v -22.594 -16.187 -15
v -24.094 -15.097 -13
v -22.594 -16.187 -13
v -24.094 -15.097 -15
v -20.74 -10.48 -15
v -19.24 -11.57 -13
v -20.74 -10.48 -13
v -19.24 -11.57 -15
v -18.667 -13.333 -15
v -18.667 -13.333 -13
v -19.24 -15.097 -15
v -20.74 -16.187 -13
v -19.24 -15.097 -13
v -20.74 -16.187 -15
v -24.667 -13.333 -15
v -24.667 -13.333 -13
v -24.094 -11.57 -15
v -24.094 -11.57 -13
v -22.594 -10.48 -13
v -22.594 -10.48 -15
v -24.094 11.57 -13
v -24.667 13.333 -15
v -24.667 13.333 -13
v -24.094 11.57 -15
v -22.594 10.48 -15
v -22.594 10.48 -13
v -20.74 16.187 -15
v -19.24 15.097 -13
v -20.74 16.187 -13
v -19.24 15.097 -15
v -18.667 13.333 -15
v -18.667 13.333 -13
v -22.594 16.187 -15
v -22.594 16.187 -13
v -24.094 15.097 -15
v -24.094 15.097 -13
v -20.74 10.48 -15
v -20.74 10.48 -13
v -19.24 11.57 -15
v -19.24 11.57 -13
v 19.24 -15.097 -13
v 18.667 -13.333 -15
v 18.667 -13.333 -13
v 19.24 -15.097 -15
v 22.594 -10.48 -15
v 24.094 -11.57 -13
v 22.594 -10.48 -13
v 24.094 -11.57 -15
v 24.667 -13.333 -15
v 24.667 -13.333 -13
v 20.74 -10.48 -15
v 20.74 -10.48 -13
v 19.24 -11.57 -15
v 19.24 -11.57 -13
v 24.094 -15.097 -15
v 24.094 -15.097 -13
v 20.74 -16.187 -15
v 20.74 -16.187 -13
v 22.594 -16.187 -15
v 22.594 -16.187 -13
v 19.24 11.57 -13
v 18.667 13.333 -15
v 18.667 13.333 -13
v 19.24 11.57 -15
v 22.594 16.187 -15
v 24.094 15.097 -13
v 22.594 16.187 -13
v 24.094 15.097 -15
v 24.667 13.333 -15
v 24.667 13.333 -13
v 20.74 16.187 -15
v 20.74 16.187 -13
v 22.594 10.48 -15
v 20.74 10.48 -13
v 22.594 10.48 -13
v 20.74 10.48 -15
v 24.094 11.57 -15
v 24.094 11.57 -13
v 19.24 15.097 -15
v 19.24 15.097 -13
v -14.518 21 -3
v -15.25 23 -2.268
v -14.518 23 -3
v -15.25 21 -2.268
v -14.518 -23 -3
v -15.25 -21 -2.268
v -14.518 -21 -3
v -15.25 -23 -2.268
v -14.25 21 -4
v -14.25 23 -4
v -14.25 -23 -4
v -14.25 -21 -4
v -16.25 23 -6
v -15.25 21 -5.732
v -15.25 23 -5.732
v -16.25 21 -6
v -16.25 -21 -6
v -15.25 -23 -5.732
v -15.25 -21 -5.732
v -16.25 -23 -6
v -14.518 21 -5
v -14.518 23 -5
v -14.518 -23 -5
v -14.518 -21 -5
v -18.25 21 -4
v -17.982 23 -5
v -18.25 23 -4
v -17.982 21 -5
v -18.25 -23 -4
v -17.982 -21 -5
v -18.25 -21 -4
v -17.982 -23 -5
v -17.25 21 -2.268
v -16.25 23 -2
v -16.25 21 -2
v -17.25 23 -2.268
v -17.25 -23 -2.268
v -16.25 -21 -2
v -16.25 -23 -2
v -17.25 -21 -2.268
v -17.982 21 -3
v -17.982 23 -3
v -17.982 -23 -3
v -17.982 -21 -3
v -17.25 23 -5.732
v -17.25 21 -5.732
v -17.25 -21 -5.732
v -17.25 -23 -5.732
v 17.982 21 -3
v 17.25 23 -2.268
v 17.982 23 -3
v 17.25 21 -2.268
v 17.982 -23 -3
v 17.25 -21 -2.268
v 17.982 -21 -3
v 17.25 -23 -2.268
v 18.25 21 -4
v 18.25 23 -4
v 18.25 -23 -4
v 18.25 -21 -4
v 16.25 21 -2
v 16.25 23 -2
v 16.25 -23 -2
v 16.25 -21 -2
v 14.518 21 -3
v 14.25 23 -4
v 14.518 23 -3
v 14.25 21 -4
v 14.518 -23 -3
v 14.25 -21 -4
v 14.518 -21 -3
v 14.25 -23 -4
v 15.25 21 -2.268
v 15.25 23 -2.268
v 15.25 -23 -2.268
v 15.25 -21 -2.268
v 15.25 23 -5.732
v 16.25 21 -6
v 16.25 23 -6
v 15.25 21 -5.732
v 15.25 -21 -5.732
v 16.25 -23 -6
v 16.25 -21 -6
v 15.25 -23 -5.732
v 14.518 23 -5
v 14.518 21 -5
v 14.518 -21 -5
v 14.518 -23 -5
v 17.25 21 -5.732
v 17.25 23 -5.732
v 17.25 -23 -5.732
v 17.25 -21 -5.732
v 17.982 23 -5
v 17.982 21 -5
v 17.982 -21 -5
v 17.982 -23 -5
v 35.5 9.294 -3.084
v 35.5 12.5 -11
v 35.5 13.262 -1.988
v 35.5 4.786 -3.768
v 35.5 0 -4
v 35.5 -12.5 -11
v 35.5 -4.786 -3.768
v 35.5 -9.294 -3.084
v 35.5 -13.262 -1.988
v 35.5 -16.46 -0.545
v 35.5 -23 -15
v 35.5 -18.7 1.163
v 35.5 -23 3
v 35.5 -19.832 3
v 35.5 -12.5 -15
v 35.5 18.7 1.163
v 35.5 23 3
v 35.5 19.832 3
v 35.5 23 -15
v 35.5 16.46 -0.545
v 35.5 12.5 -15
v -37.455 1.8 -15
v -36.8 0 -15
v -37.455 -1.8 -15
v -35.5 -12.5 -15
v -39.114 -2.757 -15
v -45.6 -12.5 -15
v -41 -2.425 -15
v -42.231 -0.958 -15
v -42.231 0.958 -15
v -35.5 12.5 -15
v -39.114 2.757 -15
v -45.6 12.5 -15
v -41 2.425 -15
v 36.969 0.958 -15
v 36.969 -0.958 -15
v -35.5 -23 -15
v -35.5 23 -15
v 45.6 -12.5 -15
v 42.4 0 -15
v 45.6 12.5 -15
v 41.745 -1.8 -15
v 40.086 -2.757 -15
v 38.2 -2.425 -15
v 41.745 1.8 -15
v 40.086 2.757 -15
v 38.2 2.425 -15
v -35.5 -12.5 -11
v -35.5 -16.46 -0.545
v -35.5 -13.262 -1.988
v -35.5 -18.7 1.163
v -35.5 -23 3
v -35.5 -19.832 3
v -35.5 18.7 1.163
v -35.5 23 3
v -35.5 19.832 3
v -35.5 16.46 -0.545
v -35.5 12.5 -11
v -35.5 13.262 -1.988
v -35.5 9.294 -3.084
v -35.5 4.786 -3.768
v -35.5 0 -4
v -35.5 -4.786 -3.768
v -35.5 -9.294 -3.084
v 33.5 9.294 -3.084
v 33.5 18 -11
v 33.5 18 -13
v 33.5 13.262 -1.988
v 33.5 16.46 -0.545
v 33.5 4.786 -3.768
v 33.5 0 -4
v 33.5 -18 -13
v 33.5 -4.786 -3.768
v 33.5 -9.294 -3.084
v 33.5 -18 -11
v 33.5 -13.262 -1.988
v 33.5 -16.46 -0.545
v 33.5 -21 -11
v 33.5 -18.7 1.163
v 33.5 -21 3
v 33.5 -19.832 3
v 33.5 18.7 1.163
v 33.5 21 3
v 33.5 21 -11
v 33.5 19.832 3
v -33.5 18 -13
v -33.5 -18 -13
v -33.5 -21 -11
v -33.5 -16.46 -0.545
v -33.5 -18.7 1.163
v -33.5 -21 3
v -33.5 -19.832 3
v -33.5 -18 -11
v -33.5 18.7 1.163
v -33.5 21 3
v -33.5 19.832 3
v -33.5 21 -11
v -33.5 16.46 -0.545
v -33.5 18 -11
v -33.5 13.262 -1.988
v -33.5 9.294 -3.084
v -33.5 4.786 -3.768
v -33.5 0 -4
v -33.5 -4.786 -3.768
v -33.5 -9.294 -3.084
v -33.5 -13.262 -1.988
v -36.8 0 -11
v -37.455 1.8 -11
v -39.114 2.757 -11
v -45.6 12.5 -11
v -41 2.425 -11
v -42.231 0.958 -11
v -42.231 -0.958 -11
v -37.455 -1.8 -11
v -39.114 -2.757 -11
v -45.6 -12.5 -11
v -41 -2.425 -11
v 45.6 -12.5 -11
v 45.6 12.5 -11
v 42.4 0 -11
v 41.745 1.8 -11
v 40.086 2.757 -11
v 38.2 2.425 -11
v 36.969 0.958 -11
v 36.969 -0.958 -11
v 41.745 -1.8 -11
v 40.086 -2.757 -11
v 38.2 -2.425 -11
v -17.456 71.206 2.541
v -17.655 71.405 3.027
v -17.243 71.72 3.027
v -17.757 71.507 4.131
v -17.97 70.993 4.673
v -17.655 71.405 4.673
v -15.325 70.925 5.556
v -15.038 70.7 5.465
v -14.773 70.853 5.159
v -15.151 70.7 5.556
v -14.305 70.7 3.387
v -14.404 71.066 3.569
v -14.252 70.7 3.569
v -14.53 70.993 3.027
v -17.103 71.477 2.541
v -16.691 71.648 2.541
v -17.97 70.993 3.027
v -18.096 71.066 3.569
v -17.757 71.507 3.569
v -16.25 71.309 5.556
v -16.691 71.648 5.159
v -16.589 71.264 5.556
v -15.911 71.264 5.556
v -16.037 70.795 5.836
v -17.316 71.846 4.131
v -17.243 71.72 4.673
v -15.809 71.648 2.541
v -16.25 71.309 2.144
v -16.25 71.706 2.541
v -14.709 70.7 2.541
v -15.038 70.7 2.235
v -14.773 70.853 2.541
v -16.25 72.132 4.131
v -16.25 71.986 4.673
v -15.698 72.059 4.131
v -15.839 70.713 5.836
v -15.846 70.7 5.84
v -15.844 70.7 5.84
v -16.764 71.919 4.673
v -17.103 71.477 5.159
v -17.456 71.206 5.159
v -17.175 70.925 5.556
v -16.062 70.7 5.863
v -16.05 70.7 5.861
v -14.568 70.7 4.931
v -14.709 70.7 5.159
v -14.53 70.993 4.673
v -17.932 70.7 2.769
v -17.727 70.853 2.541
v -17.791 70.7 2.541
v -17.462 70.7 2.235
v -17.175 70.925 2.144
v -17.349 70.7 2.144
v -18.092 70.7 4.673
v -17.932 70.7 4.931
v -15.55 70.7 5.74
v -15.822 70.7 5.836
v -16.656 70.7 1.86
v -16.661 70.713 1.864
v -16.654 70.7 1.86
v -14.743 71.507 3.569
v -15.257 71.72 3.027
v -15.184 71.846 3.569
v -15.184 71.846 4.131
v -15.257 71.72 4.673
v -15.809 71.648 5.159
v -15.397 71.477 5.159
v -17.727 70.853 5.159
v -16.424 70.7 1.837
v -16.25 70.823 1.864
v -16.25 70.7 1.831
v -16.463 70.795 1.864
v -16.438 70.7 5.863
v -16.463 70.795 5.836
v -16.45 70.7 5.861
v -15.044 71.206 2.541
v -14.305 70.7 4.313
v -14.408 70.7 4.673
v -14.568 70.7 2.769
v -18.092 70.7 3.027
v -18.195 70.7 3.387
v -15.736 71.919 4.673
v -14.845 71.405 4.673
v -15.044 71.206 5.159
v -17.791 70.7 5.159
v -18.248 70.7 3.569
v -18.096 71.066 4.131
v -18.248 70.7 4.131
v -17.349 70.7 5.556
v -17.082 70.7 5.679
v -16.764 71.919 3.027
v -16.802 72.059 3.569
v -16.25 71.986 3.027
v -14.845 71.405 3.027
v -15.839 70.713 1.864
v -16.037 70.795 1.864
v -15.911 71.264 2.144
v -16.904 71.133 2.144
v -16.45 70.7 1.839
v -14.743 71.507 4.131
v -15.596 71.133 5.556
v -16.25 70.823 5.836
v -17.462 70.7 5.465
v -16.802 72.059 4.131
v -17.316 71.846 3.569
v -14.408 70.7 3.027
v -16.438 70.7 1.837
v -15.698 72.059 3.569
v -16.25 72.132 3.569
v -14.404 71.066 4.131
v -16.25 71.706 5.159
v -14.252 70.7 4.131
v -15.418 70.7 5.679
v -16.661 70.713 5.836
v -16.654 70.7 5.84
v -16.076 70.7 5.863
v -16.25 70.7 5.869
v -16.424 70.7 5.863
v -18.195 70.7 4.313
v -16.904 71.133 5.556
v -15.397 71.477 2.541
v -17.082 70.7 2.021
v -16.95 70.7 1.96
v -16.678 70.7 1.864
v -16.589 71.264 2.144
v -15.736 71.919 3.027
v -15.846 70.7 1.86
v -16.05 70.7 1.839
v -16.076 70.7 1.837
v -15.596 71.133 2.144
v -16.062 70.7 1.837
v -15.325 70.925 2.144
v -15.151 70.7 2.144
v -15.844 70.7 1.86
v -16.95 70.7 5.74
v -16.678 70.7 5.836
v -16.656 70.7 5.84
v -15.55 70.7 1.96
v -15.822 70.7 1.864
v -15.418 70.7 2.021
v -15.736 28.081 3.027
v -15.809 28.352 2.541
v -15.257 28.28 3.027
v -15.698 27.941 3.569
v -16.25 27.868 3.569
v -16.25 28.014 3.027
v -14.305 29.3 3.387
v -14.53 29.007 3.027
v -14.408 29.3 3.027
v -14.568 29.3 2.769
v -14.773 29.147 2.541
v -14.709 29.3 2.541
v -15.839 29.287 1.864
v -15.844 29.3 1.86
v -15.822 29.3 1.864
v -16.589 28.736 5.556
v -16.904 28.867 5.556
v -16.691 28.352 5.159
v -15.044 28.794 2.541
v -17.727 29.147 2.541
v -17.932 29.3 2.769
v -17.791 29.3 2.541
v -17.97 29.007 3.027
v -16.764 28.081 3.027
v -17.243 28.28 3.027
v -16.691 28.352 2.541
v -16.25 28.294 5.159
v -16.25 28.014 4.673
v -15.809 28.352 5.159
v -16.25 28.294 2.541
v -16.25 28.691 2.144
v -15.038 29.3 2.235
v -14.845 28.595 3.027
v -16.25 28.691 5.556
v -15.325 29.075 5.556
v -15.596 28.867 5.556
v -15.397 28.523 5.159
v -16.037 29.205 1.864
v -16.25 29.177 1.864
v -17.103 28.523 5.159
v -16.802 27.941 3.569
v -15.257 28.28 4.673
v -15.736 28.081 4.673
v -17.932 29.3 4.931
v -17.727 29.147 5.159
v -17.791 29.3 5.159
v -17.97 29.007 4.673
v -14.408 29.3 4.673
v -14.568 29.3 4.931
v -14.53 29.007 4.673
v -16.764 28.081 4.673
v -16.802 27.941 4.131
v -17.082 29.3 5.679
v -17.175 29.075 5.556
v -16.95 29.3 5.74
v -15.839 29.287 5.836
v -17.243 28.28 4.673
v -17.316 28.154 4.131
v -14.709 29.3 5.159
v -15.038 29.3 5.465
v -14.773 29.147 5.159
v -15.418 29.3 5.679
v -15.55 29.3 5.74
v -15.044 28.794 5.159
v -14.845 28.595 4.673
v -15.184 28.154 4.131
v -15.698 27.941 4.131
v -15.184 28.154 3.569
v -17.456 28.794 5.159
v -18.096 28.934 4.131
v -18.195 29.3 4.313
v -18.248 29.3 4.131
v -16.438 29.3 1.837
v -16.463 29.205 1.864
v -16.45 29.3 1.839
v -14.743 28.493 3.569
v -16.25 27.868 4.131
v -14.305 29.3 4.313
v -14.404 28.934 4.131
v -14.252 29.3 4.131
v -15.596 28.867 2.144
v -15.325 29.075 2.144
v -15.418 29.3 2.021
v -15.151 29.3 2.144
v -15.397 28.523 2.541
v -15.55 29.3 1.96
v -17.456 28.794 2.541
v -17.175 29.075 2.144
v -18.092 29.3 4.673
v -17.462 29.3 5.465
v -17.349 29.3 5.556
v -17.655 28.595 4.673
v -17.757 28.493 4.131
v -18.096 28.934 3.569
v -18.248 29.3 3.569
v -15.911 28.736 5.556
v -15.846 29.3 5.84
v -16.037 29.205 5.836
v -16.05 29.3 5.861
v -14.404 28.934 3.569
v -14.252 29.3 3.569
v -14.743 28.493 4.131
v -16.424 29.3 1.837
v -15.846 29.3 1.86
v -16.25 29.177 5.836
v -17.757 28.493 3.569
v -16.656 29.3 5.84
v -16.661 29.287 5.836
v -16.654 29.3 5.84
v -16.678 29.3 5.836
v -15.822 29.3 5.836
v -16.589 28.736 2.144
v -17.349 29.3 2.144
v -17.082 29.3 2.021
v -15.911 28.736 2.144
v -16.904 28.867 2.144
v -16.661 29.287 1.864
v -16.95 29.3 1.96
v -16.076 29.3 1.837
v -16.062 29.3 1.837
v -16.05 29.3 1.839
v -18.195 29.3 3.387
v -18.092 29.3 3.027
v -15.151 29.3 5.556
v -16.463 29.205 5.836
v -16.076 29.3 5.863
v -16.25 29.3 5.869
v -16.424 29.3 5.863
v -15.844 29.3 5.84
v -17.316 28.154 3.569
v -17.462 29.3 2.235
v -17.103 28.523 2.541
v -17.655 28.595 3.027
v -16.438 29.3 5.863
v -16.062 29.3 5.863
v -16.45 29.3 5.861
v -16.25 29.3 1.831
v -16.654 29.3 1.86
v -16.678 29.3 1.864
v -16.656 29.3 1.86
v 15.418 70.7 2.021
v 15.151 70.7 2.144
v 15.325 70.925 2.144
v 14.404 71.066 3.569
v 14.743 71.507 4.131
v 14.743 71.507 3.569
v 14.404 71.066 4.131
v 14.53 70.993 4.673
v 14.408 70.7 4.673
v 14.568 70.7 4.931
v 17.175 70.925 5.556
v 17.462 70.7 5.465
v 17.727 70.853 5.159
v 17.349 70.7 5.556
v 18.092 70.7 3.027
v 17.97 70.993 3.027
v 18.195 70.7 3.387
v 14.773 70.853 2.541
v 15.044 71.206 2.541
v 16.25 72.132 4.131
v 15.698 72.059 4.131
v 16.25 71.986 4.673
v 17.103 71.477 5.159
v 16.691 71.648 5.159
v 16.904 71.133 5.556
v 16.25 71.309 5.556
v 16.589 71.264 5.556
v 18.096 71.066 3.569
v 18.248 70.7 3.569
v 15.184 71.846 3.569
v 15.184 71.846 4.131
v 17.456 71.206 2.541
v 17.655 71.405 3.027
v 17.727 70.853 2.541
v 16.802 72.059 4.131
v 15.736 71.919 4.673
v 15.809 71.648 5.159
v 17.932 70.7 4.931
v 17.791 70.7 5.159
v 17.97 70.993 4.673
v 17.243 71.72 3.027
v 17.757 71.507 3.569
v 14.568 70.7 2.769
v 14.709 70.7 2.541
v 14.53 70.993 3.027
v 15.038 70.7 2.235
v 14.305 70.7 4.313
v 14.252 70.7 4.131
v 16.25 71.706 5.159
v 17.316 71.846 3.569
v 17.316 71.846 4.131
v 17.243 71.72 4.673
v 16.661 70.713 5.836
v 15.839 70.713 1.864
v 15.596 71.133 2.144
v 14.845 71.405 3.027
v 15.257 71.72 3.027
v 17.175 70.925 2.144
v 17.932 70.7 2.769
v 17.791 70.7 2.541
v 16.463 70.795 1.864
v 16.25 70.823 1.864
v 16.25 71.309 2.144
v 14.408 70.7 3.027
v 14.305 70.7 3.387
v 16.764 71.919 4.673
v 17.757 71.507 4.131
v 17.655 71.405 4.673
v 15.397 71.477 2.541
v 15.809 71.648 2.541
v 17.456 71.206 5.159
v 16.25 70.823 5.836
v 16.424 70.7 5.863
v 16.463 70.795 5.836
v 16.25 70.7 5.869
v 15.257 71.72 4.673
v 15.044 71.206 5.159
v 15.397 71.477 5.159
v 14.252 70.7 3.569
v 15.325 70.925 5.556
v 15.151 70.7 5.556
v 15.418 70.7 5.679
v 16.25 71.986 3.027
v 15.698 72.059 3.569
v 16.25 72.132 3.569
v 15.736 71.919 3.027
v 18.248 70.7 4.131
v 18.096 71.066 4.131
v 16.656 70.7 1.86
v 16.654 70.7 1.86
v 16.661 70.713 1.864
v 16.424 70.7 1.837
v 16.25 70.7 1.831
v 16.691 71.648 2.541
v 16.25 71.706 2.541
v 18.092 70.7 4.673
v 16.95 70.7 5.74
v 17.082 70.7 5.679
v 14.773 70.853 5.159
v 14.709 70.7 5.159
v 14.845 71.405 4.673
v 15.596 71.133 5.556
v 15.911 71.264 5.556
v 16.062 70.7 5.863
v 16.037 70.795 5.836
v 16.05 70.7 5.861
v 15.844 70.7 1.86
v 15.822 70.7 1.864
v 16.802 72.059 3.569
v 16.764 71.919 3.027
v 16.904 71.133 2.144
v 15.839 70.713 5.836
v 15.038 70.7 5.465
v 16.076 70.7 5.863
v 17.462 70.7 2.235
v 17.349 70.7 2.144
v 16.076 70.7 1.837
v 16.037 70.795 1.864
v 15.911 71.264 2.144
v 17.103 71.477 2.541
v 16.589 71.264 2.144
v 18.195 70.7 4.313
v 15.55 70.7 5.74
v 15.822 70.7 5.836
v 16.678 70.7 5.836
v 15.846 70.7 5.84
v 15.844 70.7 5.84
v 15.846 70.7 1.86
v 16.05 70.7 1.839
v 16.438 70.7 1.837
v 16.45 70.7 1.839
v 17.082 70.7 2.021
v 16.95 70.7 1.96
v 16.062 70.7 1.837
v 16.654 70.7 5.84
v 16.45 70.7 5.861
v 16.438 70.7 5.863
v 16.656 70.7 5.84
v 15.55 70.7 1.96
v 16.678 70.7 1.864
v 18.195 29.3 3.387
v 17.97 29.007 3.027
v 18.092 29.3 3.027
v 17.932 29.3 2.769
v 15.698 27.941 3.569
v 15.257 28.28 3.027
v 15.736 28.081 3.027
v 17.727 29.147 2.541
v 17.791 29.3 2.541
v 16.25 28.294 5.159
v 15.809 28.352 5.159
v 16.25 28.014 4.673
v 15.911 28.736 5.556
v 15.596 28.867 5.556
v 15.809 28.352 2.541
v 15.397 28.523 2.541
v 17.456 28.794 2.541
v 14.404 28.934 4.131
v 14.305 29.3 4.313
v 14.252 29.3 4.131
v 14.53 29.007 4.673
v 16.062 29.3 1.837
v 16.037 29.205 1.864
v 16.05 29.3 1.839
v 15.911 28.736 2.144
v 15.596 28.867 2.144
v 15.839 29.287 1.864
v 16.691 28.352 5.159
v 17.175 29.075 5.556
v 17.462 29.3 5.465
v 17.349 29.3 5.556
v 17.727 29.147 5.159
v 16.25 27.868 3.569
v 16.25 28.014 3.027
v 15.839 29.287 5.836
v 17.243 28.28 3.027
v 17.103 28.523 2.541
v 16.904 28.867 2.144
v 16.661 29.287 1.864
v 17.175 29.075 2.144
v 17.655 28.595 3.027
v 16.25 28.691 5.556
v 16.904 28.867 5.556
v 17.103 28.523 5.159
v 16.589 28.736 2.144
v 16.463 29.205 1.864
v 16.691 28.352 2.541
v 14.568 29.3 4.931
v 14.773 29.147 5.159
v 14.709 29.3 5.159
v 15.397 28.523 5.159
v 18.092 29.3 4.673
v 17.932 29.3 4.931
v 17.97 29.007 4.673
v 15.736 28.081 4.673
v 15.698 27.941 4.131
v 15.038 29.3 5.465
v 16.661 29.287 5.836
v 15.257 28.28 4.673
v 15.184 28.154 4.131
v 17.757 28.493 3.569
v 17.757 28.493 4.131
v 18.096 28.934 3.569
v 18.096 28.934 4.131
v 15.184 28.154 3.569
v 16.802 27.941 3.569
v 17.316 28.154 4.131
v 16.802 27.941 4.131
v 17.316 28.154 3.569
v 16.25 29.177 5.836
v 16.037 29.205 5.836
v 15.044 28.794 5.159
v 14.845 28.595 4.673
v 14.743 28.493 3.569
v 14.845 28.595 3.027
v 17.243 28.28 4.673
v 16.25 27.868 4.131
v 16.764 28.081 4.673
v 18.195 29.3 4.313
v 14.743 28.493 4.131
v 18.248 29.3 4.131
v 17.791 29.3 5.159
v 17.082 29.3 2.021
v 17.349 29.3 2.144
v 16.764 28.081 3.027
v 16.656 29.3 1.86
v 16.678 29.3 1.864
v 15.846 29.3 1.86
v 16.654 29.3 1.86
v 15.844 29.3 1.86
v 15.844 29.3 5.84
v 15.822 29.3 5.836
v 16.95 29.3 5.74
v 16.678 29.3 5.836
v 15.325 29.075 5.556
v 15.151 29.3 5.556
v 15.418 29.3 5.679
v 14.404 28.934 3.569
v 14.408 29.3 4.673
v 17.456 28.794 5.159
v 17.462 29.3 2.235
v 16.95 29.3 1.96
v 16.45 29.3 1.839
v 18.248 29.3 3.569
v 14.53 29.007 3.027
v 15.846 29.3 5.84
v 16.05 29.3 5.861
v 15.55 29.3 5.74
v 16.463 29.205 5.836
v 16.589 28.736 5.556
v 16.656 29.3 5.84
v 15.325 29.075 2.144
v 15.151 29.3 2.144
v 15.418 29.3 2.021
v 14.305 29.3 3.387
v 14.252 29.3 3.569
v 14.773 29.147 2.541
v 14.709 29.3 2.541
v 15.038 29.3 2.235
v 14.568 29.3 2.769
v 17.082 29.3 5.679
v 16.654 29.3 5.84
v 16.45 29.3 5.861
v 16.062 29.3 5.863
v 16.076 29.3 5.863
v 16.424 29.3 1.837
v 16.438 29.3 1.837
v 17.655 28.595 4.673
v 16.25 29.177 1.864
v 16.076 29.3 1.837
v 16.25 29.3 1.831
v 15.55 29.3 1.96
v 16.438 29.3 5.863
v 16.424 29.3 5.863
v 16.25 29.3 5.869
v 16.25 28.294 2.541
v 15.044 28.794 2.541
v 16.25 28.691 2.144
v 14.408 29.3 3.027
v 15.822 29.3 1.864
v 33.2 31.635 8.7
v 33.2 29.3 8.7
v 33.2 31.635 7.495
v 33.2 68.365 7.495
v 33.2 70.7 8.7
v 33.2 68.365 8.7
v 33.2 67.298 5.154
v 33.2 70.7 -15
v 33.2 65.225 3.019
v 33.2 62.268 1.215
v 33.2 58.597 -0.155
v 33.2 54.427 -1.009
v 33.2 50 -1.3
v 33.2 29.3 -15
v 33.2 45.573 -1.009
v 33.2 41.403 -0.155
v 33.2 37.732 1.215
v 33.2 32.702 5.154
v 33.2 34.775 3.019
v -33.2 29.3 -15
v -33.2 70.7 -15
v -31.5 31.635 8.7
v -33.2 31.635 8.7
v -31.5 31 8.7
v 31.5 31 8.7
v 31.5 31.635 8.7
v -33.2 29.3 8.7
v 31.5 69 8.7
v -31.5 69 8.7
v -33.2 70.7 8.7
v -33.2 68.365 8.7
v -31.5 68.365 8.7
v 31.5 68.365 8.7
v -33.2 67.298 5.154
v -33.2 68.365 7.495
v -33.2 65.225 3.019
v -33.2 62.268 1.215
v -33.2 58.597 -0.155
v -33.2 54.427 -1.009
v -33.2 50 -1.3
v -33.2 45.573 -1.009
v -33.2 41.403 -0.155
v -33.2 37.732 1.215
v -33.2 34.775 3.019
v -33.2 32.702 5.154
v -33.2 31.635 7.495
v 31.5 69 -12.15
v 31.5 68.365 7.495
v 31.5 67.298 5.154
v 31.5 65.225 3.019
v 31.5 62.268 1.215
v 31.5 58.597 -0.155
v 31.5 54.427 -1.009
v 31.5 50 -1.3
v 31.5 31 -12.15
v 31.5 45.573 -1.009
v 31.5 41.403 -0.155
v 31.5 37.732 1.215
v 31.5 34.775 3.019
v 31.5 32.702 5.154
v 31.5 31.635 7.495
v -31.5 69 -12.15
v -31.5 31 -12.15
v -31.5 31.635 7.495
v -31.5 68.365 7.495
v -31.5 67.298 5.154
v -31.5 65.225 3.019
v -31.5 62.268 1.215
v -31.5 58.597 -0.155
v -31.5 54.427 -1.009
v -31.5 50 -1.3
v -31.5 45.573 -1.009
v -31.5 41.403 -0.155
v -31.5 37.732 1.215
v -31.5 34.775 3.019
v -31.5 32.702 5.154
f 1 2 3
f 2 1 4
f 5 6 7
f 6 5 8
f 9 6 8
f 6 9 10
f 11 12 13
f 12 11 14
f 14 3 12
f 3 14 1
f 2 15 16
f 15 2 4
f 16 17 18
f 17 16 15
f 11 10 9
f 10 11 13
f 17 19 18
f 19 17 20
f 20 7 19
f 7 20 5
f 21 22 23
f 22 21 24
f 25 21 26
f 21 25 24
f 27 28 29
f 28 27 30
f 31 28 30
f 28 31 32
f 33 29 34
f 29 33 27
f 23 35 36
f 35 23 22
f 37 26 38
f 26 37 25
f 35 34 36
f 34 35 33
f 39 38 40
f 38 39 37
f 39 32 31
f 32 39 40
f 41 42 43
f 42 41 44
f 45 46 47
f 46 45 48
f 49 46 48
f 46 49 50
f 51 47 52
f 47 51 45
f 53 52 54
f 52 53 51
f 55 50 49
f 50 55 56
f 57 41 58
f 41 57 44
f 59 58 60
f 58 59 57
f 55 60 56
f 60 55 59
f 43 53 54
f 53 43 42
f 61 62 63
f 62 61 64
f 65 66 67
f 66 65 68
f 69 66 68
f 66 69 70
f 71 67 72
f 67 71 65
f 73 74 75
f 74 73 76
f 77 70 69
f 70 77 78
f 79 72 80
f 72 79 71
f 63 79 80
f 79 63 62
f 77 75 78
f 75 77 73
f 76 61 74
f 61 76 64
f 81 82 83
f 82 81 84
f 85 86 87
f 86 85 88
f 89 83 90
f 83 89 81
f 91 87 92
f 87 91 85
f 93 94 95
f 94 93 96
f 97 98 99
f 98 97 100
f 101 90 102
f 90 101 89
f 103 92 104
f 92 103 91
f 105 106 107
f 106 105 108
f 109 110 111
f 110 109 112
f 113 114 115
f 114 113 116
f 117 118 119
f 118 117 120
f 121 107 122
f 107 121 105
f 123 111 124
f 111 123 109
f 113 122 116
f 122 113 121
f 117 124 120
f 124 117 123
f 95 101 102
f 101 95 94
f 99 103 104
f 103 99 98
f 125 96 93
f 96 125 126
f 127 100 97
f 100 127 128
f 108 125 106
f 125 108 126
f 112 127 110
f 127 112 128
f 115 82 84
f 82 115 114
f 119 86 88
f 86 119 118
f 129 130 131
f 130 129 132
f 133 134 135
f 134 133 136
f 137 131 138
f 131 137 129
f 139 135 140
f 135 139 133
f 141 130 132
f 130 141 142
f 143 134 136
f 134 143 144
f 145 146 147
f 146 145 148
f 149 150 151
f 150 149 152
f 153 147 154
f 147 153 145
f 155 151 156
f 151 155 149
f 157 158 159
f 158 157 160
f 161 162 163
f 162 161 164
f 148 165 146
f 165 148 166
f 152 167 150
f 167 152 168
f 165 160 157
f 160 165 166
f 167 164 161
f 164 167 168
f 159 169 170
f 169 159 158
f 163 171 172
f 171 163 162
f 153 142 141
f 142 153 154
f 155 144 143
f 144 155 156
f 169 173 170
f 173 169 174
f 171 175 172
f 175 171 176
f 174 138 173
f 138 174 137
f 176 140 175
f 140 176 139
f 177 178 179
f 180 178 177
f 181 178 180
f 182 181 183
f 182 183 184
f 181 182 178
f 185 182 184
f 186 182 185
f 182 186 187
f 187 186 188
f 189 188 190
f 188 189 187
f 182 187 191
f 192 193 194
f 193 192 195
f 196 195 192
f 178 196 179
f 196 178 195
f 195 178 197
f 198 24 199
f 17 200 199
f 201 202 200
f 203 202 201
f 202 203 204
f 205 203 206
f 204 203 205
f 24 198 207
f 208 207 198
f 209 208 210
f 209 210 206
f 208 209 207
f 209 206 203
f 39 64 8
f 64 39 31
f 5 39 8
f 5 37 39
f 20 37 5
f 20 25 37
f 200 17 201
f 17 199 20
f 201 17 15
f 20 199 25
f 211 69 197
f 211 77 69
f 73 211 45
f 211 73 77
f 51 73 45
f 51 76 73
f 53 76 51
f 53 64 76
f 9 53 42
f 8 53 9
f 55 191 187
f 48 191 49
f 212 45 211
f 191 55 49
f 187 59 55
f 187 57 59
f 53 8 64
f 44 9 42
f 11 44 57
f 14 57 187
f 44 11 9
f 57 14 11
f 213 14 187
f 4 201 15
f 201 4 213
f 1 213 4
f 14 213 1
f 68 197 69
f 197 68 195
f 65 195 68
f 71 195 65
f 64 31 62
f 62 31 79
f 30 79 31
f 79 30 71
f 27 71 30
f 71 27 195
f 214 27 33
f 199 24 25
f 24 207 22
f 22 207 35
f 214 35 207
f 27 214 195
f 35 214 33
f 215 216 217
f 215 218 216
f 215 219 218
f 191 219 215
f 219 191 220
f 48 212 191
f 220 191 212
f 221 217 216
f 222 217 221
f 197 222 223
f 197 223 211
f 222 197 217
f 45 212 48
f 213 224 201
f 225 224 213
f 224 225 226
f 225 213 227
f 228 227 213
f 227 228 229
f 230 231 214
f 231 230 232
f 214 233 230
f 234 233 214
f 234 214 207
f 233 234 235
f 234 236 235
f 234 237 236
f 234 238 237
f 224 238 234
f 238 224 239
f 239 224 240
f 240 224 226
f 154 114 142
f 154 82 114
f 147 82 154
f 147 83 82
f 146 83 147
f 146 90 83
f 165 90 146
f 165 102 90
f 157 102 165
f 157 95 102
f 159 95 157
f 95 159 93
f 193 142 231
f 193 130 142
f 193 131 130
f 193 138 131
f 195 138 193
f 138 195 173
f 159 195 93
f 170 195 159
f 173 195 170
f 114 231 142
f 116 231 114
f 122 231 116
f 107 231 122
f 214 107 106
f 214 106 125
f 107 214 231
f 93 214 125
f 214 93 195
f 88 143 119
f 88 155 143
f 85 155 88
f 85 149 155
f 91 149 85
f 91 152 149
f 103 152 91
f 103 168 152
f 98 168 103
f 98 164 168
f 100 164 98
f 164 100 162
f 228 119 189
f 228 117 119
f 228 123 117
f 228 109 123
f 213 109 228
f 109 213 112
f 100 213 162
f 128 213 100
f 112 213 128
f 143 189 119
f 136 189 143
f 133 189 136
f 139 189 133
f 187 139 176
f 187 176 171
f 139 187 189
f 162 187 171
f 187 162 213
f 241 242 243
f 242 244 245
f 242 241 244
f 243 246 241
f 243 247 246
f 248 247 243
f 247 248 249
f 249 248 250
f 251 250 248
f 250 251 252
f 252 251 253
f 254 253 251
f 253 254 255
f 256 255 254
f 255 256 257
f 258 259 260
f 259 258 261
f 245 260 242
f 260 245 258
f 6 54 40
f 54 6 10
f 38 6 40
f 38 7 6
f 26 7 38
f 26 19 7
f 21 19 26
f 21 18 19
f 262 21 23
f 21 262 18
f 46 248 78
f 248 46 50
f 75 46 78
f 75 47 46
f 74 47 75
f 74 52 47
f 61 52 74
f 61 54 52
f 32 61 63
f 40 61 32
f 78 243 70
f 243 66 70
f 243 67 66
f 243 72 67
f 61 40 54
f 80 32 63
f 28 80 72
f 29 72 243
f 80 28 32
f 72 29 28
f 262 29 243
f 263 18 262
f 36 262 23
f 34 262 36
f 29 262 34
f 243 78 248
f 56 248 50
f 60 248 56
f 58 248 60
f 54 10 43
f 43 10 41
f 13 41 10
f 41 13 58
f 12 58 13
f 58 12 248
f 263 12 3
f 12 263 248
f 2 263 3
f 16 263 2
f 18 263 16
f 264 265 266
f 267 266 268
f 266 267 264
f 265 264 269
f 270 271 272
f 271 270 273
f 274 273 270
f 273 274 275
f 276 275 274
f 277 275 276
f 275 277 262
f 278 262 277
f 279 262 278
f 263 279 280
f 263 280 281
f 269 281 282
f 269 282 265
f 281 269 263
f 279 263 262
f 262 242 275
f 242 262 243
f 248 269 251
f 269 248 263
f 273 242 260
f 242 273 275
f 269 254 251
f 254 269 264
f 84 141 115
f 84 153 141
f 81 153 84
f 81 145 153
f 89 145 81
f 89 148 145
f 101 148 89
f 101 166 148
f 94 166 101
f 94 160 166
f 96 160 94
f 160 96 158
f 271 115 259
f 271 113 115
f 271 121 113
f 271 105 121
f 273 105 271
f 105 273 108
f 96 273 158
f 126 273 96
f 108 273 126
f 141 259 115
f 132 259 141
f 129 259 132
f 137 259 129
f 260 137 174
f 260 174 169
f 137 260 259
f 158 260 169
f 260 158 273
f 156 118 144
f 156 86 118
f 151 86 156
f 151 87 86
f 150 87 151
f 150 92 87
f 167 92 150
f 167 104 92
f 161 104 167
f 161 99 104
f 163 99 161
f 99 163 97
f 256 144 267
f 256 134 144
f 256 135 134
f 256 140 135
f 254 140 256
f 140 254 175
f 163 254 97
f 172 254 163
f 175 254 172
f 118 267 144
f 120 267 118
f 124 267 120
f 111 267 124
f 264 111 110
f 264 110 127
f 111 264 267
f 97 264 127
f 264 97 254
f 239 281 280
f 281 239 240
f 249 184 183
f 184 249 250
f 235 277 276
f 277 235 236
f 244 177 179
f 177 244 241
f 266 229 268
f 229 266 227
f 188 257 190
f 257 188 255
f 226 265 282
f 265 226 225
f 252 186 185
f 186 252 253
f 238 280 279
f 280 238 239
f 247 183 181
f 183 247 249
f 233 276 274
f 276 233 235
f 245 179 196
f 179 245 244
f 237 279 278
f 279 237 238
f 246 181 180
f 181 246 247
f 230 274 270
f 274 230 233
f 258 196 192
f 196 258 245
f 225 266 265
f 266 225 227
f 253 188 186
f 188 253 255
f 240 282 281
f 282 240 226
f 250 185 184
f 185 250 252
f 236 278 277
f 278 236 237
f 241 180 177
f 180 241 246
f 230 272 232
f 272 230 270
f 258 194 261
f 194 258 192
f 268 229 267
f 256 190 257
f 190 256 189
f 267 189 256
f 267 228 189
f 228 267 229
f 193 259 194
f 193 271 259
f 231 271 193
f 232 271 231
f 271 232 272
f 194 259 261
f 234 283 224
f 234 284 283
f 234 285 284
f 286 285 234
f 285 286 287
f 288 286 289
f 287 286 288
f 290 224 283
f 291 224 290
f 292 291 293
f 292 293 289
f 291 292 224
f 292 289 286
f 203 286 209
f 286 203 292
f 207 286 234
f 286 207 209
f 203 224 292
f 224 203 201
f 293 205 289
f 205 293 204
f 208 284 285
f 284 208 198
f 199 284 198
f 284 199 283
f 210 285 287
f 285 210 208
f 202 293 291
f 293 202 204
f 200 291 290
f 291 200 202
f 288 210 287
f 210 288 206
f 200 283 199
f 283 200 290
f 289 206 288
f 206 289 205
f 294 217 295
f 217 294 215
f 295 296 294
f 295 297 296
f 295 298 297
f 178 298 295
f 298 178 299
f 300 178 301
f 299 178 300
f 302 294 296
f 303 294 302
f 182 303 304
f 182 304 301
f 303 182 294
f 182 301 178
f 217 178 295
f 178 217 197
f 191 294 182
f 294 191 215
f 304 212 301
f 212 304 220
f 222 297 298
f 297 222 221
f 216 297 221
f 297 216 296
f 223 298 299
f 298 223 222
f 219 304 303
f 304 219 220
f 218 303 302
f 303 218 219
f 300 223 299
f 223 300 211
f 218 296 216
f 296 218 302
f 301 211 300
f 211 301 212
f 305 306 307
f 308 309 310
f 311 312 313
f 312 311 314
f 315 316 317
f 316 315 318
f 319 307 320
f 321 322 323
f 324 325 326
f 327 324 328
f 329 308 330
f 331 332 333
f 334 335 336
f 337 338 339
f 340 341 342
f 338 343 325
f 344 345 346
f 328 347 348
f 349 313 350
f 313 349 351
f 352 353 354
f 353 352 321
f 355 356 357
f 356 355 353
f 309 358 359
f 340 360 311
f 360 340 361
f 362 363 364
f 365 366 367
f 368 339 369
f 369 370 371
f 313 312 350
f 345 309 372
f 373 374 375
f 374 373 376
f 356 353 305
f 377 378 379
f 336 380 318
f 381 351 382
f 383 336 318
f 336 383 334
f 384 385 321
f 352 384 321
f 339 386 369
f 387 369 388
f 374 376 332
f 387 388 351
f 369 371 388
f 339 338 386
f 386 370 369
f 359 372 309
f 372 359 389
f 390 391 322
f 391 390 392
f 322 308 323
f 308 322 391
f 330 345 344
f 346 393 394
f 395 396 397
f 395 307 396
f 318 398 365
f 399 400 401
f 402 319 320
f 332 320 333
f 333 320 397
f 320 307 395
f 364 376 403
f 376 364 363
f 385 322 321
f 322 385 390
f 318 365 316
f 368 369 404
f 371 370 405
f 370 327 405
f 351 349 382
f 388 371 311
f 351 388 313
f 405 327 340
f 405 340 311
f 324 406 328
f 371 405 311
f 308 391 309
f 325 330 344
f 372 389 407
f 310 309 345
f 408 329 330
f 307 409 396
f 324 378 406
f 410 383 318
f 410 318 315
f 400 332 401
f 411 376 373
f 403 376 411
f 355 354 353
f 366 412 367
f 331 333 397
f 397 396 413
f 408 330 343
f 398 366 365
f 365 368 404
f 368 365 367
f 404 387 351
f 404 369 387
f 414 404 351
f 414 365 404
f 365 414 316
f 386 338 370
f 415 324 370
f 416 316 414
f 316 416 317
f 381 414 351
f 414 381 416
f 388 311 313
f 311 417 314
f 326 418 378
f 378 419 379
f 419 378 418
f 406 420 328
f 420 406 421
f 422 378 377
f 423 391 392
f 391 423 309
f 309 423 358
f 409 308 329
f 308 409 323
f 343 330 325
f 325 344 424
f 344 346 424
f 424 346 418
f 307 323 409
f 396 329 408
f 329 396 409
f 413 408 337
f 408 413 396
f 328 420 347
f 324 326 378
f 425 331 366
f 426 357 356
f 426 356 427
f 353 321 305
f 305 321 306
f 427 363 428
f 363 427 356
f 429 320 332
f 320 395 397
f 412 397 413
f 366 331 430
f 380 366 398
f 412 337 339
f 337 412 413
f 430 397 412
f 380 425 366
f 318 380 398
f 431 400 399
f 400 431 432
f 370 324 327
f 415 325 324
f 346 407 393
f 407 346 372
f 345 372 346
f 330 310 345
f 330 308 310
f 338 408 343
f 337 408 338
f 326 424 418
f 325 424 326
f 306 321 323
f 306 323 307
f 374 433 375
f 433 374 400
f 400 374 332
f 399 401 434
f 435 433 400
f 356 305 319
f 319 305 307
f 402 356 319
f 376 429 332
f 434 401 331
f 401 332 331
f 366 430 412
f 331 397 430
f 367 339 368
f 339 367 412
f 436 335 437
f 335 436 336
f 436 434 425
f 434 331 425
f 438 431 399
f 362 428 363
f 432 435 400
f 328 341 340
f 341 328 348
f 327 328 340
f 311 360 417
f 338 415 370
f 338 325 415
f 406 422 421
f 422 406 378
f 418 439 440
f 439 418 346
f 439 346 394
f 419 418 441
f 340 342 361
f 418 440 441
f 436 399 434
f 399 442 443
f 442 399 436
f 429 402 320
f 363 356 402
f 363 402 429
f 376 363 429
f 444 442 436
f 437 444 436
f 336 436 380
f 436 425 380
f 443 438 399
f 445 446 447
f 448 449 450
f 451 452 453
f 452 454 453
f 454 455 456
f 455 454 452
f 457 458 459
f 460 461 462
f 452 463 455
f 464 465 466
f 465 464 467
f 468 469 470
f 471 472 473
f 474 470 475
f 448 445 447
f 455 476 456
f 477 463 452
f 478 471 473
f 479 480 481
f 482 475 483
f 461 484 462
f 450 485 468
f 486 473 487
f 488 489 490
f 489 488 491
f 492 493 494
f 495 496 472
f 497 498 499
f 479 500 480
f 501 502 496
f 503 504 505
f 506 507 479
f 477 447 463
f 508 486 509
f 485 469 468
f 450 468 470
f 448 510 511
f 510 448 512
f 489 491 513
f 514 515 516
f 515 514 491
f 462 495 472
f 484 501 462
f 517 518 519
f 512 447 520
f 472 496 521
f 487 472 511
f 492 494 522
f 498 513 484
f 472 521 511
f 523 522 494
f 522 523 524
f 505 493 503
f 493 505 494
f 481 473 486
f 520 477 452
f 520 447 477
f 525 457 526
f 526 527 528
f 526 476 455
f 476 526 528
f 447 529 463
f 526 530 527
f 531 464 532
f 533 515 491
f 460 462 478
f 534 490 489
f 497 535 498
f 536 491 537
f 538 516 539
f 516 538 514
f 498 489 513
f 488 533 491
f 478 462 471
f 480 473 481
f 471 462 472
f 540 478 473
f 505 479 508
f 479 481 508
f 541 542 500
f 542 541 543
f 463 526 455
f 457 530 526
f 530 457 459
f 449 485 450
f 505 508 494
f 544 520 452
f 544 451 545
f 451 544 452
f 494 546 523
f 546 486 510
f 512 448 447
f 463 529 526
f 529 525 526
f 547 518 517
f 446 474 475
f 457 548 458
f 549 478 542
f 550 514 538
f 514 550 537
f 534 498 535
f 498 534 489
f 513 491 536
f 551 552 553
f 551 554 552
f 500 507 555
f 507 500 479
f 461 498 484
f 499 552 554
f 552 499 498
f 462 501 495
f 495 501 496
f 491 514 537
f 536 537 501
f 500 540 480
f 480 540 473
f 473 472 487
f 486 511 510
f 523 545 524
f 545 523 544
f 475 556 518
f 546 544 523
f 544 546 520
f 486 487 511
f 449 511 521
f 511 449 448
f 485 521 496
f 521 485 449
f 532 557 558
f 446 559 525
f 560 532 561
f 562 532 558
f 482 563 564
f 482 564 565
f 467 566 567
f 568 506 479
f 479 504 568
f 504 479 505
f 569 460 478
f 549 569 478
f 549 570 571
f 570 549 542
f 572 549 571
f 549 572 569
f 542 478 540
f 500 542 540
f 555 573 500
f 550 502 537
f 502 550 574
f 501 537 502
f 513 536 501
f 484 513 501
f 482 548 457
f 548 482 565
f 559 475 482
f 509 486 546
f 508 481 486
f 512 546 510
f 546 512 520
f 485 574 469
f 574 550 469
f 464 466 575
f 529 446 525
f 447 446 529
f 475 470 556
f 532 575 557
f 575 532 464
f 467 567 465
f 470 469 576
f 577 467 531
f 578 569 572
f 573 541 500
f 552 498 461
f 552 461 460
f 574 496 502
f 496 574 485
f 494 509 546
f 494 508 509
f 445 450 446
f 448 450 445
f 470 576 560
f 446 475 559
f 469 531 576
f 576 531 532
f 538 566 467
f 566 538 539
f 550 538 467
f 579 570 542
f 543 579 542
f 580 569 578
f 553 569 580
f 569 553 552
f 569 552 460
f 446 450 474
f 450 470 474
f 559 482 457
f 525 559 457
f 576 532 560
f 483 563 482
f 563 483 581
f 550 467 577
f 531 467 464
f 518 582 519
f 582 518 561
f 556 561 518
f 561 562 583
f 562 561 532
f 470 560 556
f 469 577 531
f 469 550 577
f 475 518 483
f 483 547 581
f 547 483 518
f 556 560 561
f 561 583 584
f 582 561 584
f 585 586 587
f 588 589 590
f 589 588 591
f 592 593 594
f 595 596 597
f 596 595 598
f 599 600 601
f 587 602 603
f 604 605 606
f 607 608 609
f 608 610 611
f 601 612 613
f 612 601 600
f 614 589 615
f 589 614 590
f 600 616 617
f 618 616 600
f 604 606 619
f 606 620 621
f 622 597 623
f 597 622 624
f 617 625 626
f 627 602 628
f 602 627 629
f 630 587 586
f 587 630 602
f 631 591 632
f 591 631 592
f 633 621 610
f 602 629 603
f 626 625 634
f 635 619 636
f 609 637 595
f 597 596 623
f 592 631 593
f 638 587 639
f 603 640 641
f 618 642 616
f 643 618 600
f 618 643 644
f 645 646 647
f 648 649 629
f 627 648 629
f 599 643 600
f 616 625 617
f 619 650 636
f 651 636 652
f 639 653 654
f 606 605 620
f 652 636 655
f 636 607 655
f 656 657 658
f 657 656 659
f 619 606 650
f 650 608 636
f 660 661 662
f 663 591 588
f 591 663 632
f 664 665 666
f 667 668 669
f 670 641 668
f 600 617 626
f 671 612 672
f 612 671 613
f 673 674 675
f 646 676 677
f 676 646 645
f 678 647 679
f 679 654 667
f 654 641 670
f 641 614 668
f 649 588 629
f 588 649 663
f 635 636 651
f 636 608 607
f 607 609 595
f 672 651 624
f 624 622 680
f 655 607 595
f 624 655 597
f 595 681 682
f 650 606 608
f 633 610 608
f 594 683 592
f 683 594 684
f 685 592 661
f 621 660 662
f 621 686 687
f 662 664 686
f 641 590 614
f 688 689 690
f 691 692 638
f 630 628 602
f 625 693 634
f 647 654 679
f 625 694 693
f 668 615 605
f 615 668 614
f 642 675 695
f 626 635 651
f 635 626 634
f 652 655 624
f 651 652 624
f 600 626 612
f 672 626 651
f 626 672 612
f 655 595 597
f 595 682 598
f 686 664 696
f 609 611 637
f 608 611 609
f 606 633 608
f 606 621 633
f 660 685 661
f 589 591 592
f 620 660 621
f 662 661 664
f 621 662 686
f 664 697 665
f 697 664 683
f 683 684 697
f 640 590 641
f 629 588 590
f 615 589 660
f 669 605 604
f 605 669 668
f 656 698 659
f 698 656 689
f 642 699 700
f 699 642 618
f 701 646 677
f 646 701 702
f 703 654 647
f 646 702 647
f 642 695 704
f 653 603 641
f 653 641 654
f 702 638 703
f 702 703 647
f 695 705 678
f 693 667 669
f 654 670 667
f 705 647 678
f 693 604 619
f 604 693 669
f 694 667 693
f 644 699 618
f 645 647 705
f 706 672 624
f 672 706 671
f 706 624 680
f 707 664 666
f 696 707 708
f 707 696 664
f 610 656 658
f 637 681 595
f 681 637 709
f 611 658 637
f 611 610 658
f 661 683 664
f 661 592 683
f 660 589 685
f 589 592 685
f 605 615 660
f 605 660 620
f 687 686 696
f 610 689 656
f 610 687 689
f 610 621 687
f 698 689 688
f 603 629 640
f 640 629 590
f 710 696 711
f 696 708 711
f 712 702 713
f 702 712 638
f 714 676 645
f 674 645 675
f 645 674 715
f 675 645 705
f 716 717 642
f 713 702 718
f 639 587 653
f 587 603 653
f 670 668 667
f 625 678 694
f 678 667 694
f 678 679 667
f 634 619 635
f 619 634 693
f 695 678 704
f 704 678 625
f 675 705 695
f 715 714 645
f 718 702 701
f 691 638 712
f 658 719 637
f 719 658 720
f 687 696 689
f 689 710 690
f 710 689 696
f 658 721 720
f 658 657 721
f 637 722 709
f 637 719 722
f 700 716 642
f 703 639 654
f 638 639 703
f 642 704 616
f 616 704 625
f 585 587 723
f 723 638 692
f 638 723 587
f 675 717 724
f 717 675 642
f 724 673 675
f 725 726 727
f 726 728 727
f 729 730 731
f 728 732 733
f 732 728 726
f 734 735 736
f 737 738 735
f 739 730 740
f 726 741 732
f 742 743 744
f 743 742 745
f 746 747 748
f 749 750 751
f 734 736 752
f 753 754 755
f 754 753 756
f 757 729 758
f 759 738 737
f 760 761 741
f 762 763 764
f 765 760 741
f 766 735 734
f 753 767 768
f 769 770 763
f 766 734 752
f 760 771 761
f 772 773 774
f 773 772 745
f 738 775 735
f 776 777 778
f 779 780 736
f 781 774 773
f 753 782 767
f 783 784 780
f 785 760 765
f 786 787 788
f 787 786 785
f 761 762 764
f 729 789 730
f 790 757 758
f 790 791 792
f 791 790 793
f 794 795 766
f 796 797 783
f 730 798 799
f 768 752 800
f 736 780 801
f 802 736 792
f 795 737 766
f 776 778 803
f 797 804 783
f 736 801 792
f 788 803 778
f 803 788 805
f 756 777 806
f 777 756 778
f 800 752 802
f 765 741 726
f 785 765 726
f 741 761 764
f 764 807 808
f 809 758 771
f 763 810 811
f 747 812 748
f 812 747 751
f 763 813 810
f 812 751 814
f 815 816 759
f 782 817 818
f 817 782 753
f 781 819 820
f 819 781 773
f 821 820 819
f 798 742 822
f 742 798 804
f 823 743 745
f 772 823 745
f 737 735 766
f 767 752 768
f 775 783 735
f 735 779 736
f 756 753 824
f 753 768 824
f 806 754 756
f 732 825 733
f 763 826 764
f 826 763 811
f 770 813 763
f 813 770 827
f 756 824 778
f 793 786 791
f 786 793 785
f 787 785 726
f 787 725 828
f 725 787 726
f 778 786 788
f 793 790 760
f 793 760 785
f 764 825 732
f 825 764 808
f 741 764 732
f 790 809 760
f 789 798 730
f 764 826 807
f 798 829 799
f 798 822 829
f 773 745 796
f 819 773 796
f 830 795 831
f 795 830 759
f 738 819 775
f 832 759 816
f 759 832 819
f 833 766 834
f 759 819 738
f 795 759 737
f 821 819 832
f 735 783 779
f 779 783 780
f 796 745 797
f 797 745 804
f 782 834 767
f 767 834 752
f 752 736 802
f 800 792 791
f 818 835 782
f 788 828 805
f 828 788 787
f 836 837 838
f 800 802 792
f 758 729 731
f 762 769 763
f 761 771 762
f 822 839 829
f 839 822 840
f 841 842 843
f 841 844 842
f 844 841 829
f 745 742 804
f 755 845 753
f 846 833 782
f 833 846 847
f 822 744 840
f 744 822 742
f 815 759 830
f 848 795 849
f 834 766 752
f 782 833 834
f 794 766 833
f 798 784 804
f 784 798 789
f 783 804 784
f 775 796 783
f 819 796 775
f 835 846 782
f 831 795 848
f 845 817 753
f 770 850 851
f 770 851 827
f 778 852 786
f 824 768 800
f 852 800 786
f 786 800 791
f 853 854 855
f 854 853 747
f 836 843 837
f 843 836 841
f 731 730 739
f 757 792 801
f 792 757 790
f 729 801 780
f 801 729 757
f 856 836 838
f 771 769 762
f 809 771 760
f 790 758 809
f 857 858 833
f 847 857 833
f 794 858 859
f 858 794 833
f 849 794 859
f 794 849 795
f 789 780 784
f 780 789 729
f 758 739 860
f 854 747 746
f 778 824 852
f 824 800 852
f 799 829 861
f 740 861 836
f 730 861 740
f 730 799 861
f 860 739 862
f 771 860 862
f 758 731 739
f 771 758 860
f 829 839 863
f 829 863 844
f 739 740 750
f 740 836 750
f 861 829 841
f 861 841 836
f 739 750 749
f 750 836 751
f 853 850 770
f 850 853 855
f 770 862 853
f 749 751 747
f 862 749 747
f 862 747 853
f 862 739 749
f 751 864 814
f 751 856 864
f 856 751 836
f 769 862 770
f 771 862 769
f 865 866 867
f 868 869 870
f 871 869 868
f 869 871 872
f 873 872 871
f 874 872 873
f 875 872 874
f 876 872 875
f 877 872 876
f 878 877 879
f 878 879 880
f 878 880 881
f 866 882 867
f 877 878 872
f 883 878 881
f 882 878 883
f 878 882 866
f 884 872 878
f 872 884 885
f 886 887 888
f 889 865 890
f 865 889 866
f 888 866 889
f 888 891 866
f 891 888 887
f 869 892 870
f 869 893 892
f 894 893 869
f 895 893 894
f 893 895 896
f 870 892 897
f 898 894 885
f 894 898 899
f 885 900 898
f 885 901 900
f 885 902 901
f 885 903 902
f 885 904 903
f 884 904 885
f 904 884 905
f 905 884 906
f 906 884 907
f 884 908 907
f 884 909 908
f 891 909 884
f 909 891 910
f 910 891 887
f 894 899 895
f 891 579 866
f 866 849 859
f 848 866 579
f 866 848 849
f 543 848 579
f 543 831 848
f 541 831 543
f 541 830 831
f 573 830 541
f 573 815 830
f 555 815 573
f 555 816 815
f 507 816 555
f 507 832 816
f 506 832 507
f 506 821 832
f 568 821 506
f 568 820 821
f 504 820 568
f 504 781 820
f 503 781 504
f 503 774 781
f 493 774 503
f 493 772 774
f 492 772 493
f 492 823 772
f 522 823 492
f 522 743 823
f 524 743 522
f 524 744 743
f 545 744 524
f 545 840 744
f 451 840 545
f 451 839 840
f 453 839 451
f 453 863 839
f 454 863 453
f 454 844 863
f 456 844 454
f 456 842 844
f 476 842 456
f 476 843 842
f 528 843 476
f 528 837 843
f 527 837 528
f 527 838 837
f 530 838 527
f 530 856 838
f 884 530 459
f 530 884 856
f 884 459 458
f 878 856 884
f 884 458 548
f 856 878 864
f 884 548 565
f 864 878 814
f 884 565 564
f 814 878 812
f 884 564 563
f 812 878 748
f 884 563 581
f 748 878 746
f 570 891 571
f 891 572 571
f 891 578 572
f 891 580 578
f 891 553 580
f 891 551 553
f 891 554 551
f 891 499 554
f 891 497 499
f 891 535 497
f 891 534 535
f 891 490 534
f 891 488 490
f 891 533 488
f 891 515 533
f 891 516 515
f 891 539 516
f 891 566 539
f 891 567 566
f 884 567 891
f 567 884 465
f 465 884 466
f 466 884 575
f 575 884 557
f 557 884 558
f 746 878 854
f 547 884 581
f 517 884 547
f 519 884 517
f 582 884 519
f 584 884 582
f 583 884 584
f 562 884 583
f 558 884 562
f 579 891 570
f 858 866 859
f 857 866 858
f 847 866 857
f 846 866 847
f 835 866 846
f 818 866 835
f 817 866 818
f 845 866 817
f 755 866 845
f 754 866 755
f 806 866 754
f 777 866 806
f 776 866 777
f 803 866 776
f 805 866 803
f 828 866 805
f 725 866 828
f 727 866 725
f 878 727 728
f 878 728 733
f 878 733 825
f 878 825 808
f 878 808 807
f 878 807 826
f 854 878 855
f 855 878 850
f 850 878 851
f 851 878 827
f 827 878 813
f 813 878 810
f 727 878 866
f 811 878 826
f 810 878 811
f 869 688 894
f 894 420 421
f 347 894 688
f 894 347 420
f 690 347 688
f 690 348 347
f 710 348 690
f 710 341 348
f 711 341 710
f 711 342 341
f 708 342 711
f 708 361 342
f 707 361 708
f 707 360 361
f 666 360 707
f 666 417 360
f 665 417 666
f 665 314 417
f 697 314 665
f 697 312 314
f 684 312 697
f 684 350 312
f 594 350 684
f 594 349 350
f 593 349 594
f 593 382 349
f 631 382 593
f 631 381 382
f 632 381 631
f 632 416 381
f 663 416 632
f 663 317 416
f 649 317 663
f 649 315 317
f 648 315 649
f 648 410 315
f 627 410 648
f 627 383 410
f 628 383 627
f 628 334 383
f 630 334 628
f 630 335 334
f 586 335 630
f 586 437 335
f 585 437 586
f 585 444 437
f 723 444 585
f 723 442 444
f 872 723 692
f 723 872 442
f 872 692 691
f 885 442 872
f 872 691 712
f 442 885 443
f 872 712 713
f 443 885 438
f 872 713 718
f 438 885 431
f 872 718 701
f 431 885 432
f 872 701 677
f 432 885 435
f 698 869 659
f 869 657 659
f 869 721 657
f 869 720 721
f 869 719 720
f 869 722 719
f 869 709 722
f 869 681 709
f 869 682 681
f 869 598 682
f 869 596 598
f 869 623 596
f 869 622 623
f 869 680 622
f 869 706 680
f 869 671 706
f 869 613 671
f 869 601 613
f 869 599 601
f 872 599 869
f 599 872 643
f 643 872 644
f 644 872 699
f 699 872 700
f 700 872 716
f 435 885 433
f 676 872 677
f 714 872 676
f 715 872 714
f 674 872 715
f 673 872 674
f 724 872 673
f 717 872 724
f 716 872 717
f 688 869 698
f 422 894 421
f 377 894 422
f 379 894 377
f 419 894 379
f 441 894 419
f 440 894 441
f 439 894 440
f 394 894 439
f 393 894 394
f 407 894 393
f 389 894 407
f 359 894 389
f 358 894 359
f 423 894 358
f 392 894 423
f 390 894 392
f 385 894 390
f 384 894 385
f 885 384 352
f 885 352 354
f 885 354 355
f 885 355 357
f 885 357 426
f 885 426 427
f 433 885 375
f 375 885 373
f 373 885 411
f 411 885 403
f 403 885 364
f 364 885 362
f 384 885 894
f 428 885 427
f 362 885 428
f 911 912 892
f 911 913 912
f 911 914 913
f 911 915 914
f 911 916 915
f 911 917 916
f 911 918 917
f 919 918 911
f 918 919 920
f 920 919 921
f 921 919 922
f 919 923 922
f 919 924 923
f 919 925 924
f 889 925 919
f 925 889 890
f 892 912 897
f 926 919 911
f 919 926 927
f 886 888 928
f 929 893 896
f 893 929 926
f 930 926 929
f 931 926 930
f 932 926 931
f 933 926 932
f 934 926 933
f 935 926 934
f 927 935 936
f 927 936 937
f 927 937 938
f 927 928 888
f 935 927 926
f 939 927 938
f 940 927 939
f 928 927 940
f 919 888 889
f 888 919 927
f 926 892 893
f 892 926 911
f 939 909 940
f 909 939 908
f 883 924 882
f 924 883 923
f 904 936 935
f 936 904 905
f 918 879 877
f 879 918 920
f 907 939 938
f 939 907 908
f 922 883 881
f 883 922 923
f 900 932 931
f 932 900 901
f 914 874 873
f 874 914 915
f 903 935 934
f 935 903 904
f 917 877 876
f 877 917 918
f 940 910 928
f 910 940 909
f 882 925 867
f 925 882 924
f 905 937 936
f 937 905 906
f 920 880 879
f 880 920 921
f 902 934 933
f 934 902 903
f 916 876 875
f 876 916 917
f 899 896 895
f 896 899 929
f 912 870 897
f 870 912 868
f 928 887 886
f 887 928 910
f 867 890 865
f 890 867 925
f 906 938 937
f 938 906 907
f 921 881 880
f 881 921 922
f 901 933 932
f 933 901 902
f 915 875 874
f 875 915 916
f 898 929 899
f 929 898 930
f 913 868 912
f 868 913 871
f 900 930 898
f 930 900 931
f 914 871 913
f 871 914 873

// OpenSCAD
pcb = [ 65, 40, 22 ];
//pcb = [ 80, 44, 16 ];

c = 0.3;

difference()
{
translate( [ 0, 0, 0 ] )
 box( pcb[0]+6, pcb[1]+6, pcb[2]+8 );
translate( [ 0, 0, 1 ] )
 box( pcb[0]+2, pcb[1]-4, pcb[2]+6 );
translate( [ 0, 0, 2 ] )
 box( pcb[0]+2, pcb[1]+2, pcb[2]+4 );

for ( a = [ -1, +1 ], b = [ -1, +1 ] )
	translate( [ a*pcb[0]/3, b*pcb[1]/3, 0 ] )
		cylinder( r = 3, h = pcb[2]*2, center = true );

translate( [ 0, 0, -pcb[2]/2+12+3 ] ) rotate( [ 0, 90, 0 ] ) scale( [ 1, pcb[1]/16, 1 ] )
 cylinder( r = 8, h = pcb[0]*2, center = true );

for ( a = [ -1, +1 ] )
	translate( [ a*pcb[0]/4, 0, -pcb[2]/2+7 ] ) rotate( [ 90, 0, 0 ] )
		cylinder( r = 2, h = pcb[1]*2, center = true, $fn = 12 );

translate( [ 0, 0, 12 ] )
	box( pcb[0]+10, pcb[1]+10, pcb[2]-8/2 );
}

for ( a = [ -1, +1 ] )
translate( [ a*(pcb[0]/2+7.1), 0, - pcb[2]/2-2 ] )
	difference()
	{
		box( 12, 25, 4 );
		cylinder( r = 2.5+c, h = 10, center = true );
	}

translate( [ 0, pcb[1]+10, -c/2 ] )
rotate( [ 180, 0, 0 ] )
difference()
{
union()
{
	translate( [ 0, 0, 3 ] )
		box( pcb[0]+2-2*c, pcb[1]+2-2*c, pcb[2]+2-c );
	for ( a = [ -1, +1 ], b = [ -1, +1 ] )
		translate( [ a*pcb[0]/4, b*pcb[1]/2, -pcb[2]/2+7 ] )
			sphere( r = 2.15, center = true, $fn = 24 );
}
translate( [ 0, 0, 1 ] )
	box( pcb[0]-2, pcb[1]-2, pcb[2] );
translate( [ 0, 0, 3-(pcb[2]+2-c)/2 ] ) rotate( [ 0, 90, 0 ] ) scale( [ 1.25, (pcb[1]-3)/16, 1 ] )
	cylinder( r = 8, h = pcb[0]*2, center = true );
}


module box( x, y, z, w = 0 )
{
	difference()
	{
		cube( [ x - ( w < 0 ? w*2 : 0 ), y - ( w < 0 ? w*2 : 0 ), z - ( w < 0 ? w*2 : 0 ) ], center = true );

		if ( w != 0 )
			cube( [ x - ( w > 0 ? w*2 : 0 ), y - ( w > 0 ? w*2 : 0 ), z - ( w > 0 ? w*2 : 0 ) ], center = true );
	}
}
